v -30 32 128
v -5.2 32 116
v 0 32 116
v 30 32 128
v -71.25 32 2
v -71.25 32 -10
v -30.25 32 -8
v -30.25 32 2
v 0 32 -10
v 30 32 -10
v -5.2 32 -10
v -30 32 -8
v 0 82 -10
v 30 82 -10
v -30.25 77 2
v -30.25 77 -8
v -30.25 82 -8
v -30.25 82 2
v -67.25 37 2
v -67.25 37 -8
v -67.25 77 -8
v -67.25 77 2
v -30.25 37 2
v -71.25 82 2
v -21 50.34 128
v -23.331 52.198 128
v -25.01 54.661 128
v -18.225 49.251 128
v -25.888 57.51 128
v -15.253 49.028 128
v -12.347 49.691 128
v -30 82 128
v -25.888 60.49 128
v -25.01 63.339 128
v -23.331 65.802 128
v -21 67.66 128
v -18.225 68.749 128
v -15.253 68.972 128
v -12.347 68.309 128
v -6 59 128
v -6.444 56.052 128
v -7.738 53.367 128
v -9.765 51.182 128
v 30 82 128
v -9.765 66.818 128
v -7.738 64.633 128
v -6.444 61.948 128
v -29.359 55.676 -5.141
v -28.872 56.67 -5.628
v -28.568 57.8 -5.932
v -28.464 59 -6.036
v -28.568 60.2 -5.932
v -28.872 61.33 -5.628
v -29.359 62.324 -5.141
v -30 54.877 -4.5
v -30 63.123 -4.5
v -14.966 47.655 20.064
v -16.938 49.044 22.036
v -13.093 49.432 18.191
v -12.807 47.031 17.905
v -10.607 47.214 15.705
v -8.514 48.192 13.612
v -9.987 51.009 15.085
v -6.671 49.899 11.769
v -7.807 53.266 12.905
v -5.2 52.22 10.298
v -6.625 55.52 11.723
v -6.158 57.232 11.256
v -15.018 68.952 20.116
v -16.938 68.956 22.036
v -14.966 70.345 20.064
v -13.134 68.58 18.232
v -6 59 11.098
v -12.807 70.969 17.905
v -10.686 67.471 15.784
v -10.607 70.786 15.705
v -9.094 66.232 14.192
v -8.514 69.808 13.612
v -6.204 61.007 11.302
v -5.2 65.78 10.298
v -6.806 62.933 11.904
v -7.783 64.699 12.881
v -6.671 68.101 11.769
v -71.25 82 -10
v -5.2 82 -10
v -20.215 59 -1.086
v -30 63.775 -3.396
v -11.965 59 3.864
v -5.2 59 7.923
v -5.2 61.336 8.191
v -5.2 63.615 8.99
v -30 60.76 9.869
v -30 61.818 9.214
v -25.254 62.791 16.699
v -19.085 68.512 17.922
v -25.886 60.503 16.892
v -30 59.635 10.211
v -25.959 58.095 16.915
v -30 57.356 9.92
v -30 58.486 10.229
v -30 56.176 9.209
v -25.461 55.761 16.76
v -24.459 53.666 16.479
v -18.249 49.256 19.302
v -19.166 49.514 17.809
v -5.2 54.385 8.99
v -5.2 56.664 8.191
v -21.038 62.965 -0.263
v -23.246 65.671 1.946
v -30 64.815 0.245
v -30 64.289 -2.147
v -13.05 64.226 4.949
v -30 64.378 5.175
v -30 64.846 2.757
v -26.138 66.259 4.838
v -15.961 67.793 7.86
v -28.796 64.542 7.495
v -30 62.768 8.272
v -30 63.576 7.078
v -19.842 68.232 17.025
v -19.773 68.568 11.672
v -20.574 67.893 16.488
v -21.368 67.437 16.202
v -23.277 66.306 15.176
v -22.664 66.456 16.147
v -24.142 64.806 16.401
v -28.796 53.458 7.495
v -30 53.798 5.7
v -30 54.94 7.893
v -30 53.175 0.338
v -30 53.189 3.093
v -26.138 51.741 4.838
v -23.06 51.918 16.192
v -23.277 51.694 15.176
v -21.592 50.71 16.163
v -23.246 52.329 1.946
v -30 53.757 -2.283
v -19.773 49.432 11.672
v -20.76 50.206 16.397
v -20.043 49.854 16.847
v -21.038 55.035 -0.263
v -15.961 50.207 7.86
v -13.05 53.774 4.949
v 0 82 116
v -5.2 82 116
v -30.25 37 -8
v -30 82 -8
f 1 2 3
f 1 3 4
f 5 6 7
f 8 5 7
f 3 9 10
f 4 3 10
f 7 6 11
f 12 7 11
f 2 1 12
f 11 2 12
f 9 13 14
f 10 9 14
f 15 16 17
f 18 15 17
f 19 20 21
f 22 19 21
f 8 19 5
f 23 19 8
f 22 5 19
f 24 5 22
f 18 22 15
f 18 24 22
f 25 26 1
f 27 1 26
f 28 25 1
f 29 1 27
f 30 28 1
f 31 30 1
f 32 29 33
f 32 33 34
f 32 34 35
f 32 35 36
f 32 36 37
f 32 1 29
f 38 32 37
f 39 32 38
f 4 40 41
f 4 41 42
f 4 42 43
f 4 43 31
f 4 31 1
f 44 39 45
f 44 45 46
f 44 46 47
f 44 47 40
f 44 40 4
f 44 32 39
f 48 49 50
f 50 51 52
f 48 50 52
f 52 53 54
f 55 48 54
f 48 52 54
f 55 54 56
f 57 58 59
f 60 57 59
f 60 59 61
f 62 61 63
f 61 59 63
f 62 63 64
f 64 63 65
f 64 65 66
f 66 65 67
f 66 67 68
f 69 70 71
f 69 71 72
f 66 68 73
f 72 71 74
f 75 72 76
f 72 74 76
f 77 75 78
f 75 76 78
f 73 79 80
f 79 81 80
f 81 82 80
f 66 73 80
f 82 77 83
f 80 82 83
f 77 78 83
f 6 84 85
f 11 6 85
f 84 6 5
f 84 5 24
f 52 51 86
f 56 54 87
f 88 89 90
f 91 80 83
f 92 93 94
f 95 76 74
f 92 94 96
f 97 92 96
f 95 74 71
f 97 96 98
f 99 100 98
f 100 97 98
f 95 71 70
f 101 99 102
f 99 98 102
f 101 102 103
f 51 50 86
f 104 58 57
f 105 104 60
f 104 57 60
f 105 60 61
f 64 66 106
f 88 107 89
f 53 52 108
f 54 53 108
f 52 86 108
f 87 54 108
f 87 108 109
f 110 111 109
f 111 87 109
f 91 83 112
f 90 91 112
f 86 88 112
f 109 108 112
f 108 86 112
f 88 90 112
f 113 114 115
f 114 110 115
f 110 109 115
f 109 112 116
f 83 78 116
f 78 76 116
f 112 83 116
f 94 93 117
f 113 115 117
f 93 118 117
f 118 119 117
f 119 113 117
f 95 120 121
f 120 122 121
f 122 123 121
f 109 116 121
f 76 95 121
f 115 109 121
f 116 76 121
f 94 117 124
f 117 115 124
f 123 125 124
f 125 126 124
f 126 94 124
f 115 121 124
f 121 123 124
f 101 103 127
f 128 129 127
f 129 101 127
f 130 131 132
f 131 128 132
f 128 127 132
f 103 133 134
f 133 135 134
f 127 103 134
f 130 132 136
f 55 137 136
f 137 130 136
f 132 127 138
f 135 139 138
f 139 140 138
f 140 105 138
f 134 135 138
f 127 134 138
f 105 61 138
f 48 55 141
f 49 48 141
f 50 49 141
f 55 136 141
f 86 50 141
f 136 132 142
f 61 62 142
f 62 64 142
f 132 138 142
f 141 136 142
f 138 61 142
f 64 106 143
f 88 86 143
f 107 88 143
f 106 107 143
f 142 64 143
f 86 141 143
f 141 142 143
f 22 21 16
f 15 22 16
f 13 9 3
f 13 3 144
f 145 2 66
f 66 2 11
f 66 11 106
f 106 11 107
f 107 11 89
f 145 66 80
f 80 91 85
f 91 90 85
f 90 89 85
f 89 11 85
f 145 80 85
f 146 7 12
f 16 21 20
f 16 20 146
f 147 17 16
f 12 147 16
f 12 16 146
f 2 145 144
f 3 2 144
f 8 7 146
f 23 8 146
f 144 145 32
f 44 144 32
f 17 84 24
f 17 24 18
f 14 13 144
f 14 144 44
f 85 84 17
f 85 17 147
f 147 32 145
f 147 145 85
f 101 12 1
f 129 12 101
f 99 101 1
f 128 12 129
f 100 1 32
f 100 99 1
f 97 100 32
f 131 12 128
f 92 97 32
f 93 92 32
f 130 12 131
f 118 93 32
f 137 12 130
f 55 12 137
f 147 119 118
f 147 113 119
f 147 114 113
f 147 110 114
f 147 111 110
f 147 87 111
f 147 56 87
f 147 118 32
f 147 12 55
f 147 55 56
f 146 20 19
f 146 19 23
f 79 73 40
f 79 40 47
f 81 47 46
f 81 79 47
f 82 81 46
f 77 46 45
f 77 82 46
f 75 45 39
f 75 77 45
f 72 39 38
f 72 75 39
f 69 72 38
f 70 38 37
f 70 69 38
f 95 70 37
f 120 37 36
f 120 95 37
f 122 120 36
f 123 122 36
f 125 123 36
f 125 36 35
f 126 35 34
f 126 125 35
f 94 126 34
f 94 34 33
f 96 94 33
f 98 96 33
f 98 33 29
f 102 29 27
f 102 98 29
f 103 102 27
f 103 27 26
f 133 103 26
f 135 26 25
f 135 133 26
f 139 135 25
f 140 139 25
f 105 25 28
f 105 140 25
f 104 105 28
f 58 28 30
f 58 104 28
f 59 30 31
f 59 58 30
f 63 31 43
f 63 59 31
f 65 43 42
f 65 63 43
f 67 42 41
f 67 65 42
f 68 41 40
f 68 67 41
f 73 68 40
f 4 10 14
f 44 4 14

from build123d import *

# Parameters (mm, degrees)
CYLINDER_R          = 10
CYLINDER_DEPTH      = 129
CONE001_PITCH_ANGLE = 45
BOX002_W            = 5.2
BOX002_H            = 50
BOX002_DEPTH        = 126
BOX001_W            = 60
BOX001_H            = 50
BOX001_DEPTH        = 138
BOX005_W            = 4
BOX005_H            = 50
BOX005_DEPTH        = 12
BOX004_W            = 66
BOX004_H            = 50
BOX004_DEPTH        = 2
BOX006_W            = 41
BOX006_H            = 5
BOX006_DEPTH        = 12
BOX007_W            = 41
BOX007_H            = 5
BOX007_DEPTH        = 12


with BuildPart() as cylinder:
    # Cylinder → Cylinder (new body)
    with BuildSketch(Plane(origin=(-16, 59, 11), x_dir=(1, 0, 0), z_dir=(0, 0, 1))):
        Circle(CYLINDER_R)
    extrude(amount=CYLINDER_DEPTH)


with BuildPart() as cone001:
    # Cone001 → Cone001 (revolve)
    with BuildSketch(Plane.XZ):
        Polygon((0, 0), (5, 0), (12, 28), (0, 28), align=None)
    revolve(axis=Axis((0, 0, 0), (0, 0, 1)))


with BuildPart() as cone001_1:
    # Cone001 pitch: moved
    add(cone001.part.rotate(Axis((0, 0, 0), (0, 1, 0)), CONE001_PITCH_ANGLE))


with BuildPart() as cone001_2:
    # Cone001 placement: moved
    add(cone001_1.part.moved(Location((-32, 59, -2.5))))


with BuildPart() as cube002:
    # Box002 → Box002 (new body)
    with BuildSketch(Plane(origin=(-5.2, 32, -10), x_dir=(1, 0, 0), z_dir=(0, 0, 1))):
        with Locations((2.6, 25)):
            Rectangle(BOX002_W, BOX002_H)
    extrude(amount=BOX002_DEPTH)


with BuildPart() as cut002:
    # Box001 → Box001 (new body)
    with BuildSketch(Plane(origin=(-30, 32, -10), x_dir=(1, 0, 0), z_dir=(0, 0, 1))):
        with Locations((30, 25)):
            Rectangle(BOX001_W, BOX001_H)
    extrude(amount=BOX001_DEPTH)

    # Cut: cut Cube002
    add(cube002.part, mode=Mode.SUBTRACT)

    # Cut001: cut Cone001
    add(cone001_2.part, mode=Mode.SUBTRACT)

    # Cut002: cut Cylinder
    add(cylinder.part, mode=Mode.SUBTRACT)


with BuildPart() as cube005:
    # Box005 → Box005 (new body)
    with BuildSketch(Plane(origin=(-215, 176, -4), x_dir=(1, 0, 0), z_dir=(0, 0, 1))):
        with Locations((2, 25)):
            Rectangle(BOX005_W, BOX005_H)
    extrude(amount=BOX005_DEPTH)


with BuildPart() as fusion001:
    # Box004 → Box004 (new body)
    with BuildSketch(Plane(origin=(-215, 176, -4), x_dir=(1, 0, 0), z_dir=(0, 0, 1))):
        with Locations((33, 25)):
            Rectangle(BOX004_W, BOX004_H)
    extrude(amount=BOX004_DEPTH)

    # Fusion001: union Cube005
    add(cube005.part)


with BuildPart() as cube006:
    # Box006 → Box006 (new body)
    with BuildSketch(Plane(origin=(-215, 176, -4), x_dir=(1, 0, 0), z_dir=(0, 0, 1))):
        with Locations((20.5, 2.5)):
            Rectangle(BOX006_W, BOX006_H)
    extrude(amount=BOX006_DEPTH)


with BuildPart() as fusion003:
    # Box007 → Box007 (new body)
    with BuildSketch(Plane(origin=(-215, 221, -4), x_dir=(1, 0, 0), z_dir=(0, 0, 1))):
        with Locations((20.5, 2.5)):
            Rectangle(BOX007_W, BOX007_H)
    extrude(amount=BOX007_DEPTH)

    # Fusion: union Cube006
    add(cube006.part)

    # Fusion002: union Fusion001
    add(fusion001.part)


with BuildPart() as fusion003_1:
    # Fusion002 placement: moved
    add(fusion003.part.moved(Location((143.75, -144, -6))))

    # Fusion003: union Cut002
    add(cut002.part)


solid = fusion003_1.part
